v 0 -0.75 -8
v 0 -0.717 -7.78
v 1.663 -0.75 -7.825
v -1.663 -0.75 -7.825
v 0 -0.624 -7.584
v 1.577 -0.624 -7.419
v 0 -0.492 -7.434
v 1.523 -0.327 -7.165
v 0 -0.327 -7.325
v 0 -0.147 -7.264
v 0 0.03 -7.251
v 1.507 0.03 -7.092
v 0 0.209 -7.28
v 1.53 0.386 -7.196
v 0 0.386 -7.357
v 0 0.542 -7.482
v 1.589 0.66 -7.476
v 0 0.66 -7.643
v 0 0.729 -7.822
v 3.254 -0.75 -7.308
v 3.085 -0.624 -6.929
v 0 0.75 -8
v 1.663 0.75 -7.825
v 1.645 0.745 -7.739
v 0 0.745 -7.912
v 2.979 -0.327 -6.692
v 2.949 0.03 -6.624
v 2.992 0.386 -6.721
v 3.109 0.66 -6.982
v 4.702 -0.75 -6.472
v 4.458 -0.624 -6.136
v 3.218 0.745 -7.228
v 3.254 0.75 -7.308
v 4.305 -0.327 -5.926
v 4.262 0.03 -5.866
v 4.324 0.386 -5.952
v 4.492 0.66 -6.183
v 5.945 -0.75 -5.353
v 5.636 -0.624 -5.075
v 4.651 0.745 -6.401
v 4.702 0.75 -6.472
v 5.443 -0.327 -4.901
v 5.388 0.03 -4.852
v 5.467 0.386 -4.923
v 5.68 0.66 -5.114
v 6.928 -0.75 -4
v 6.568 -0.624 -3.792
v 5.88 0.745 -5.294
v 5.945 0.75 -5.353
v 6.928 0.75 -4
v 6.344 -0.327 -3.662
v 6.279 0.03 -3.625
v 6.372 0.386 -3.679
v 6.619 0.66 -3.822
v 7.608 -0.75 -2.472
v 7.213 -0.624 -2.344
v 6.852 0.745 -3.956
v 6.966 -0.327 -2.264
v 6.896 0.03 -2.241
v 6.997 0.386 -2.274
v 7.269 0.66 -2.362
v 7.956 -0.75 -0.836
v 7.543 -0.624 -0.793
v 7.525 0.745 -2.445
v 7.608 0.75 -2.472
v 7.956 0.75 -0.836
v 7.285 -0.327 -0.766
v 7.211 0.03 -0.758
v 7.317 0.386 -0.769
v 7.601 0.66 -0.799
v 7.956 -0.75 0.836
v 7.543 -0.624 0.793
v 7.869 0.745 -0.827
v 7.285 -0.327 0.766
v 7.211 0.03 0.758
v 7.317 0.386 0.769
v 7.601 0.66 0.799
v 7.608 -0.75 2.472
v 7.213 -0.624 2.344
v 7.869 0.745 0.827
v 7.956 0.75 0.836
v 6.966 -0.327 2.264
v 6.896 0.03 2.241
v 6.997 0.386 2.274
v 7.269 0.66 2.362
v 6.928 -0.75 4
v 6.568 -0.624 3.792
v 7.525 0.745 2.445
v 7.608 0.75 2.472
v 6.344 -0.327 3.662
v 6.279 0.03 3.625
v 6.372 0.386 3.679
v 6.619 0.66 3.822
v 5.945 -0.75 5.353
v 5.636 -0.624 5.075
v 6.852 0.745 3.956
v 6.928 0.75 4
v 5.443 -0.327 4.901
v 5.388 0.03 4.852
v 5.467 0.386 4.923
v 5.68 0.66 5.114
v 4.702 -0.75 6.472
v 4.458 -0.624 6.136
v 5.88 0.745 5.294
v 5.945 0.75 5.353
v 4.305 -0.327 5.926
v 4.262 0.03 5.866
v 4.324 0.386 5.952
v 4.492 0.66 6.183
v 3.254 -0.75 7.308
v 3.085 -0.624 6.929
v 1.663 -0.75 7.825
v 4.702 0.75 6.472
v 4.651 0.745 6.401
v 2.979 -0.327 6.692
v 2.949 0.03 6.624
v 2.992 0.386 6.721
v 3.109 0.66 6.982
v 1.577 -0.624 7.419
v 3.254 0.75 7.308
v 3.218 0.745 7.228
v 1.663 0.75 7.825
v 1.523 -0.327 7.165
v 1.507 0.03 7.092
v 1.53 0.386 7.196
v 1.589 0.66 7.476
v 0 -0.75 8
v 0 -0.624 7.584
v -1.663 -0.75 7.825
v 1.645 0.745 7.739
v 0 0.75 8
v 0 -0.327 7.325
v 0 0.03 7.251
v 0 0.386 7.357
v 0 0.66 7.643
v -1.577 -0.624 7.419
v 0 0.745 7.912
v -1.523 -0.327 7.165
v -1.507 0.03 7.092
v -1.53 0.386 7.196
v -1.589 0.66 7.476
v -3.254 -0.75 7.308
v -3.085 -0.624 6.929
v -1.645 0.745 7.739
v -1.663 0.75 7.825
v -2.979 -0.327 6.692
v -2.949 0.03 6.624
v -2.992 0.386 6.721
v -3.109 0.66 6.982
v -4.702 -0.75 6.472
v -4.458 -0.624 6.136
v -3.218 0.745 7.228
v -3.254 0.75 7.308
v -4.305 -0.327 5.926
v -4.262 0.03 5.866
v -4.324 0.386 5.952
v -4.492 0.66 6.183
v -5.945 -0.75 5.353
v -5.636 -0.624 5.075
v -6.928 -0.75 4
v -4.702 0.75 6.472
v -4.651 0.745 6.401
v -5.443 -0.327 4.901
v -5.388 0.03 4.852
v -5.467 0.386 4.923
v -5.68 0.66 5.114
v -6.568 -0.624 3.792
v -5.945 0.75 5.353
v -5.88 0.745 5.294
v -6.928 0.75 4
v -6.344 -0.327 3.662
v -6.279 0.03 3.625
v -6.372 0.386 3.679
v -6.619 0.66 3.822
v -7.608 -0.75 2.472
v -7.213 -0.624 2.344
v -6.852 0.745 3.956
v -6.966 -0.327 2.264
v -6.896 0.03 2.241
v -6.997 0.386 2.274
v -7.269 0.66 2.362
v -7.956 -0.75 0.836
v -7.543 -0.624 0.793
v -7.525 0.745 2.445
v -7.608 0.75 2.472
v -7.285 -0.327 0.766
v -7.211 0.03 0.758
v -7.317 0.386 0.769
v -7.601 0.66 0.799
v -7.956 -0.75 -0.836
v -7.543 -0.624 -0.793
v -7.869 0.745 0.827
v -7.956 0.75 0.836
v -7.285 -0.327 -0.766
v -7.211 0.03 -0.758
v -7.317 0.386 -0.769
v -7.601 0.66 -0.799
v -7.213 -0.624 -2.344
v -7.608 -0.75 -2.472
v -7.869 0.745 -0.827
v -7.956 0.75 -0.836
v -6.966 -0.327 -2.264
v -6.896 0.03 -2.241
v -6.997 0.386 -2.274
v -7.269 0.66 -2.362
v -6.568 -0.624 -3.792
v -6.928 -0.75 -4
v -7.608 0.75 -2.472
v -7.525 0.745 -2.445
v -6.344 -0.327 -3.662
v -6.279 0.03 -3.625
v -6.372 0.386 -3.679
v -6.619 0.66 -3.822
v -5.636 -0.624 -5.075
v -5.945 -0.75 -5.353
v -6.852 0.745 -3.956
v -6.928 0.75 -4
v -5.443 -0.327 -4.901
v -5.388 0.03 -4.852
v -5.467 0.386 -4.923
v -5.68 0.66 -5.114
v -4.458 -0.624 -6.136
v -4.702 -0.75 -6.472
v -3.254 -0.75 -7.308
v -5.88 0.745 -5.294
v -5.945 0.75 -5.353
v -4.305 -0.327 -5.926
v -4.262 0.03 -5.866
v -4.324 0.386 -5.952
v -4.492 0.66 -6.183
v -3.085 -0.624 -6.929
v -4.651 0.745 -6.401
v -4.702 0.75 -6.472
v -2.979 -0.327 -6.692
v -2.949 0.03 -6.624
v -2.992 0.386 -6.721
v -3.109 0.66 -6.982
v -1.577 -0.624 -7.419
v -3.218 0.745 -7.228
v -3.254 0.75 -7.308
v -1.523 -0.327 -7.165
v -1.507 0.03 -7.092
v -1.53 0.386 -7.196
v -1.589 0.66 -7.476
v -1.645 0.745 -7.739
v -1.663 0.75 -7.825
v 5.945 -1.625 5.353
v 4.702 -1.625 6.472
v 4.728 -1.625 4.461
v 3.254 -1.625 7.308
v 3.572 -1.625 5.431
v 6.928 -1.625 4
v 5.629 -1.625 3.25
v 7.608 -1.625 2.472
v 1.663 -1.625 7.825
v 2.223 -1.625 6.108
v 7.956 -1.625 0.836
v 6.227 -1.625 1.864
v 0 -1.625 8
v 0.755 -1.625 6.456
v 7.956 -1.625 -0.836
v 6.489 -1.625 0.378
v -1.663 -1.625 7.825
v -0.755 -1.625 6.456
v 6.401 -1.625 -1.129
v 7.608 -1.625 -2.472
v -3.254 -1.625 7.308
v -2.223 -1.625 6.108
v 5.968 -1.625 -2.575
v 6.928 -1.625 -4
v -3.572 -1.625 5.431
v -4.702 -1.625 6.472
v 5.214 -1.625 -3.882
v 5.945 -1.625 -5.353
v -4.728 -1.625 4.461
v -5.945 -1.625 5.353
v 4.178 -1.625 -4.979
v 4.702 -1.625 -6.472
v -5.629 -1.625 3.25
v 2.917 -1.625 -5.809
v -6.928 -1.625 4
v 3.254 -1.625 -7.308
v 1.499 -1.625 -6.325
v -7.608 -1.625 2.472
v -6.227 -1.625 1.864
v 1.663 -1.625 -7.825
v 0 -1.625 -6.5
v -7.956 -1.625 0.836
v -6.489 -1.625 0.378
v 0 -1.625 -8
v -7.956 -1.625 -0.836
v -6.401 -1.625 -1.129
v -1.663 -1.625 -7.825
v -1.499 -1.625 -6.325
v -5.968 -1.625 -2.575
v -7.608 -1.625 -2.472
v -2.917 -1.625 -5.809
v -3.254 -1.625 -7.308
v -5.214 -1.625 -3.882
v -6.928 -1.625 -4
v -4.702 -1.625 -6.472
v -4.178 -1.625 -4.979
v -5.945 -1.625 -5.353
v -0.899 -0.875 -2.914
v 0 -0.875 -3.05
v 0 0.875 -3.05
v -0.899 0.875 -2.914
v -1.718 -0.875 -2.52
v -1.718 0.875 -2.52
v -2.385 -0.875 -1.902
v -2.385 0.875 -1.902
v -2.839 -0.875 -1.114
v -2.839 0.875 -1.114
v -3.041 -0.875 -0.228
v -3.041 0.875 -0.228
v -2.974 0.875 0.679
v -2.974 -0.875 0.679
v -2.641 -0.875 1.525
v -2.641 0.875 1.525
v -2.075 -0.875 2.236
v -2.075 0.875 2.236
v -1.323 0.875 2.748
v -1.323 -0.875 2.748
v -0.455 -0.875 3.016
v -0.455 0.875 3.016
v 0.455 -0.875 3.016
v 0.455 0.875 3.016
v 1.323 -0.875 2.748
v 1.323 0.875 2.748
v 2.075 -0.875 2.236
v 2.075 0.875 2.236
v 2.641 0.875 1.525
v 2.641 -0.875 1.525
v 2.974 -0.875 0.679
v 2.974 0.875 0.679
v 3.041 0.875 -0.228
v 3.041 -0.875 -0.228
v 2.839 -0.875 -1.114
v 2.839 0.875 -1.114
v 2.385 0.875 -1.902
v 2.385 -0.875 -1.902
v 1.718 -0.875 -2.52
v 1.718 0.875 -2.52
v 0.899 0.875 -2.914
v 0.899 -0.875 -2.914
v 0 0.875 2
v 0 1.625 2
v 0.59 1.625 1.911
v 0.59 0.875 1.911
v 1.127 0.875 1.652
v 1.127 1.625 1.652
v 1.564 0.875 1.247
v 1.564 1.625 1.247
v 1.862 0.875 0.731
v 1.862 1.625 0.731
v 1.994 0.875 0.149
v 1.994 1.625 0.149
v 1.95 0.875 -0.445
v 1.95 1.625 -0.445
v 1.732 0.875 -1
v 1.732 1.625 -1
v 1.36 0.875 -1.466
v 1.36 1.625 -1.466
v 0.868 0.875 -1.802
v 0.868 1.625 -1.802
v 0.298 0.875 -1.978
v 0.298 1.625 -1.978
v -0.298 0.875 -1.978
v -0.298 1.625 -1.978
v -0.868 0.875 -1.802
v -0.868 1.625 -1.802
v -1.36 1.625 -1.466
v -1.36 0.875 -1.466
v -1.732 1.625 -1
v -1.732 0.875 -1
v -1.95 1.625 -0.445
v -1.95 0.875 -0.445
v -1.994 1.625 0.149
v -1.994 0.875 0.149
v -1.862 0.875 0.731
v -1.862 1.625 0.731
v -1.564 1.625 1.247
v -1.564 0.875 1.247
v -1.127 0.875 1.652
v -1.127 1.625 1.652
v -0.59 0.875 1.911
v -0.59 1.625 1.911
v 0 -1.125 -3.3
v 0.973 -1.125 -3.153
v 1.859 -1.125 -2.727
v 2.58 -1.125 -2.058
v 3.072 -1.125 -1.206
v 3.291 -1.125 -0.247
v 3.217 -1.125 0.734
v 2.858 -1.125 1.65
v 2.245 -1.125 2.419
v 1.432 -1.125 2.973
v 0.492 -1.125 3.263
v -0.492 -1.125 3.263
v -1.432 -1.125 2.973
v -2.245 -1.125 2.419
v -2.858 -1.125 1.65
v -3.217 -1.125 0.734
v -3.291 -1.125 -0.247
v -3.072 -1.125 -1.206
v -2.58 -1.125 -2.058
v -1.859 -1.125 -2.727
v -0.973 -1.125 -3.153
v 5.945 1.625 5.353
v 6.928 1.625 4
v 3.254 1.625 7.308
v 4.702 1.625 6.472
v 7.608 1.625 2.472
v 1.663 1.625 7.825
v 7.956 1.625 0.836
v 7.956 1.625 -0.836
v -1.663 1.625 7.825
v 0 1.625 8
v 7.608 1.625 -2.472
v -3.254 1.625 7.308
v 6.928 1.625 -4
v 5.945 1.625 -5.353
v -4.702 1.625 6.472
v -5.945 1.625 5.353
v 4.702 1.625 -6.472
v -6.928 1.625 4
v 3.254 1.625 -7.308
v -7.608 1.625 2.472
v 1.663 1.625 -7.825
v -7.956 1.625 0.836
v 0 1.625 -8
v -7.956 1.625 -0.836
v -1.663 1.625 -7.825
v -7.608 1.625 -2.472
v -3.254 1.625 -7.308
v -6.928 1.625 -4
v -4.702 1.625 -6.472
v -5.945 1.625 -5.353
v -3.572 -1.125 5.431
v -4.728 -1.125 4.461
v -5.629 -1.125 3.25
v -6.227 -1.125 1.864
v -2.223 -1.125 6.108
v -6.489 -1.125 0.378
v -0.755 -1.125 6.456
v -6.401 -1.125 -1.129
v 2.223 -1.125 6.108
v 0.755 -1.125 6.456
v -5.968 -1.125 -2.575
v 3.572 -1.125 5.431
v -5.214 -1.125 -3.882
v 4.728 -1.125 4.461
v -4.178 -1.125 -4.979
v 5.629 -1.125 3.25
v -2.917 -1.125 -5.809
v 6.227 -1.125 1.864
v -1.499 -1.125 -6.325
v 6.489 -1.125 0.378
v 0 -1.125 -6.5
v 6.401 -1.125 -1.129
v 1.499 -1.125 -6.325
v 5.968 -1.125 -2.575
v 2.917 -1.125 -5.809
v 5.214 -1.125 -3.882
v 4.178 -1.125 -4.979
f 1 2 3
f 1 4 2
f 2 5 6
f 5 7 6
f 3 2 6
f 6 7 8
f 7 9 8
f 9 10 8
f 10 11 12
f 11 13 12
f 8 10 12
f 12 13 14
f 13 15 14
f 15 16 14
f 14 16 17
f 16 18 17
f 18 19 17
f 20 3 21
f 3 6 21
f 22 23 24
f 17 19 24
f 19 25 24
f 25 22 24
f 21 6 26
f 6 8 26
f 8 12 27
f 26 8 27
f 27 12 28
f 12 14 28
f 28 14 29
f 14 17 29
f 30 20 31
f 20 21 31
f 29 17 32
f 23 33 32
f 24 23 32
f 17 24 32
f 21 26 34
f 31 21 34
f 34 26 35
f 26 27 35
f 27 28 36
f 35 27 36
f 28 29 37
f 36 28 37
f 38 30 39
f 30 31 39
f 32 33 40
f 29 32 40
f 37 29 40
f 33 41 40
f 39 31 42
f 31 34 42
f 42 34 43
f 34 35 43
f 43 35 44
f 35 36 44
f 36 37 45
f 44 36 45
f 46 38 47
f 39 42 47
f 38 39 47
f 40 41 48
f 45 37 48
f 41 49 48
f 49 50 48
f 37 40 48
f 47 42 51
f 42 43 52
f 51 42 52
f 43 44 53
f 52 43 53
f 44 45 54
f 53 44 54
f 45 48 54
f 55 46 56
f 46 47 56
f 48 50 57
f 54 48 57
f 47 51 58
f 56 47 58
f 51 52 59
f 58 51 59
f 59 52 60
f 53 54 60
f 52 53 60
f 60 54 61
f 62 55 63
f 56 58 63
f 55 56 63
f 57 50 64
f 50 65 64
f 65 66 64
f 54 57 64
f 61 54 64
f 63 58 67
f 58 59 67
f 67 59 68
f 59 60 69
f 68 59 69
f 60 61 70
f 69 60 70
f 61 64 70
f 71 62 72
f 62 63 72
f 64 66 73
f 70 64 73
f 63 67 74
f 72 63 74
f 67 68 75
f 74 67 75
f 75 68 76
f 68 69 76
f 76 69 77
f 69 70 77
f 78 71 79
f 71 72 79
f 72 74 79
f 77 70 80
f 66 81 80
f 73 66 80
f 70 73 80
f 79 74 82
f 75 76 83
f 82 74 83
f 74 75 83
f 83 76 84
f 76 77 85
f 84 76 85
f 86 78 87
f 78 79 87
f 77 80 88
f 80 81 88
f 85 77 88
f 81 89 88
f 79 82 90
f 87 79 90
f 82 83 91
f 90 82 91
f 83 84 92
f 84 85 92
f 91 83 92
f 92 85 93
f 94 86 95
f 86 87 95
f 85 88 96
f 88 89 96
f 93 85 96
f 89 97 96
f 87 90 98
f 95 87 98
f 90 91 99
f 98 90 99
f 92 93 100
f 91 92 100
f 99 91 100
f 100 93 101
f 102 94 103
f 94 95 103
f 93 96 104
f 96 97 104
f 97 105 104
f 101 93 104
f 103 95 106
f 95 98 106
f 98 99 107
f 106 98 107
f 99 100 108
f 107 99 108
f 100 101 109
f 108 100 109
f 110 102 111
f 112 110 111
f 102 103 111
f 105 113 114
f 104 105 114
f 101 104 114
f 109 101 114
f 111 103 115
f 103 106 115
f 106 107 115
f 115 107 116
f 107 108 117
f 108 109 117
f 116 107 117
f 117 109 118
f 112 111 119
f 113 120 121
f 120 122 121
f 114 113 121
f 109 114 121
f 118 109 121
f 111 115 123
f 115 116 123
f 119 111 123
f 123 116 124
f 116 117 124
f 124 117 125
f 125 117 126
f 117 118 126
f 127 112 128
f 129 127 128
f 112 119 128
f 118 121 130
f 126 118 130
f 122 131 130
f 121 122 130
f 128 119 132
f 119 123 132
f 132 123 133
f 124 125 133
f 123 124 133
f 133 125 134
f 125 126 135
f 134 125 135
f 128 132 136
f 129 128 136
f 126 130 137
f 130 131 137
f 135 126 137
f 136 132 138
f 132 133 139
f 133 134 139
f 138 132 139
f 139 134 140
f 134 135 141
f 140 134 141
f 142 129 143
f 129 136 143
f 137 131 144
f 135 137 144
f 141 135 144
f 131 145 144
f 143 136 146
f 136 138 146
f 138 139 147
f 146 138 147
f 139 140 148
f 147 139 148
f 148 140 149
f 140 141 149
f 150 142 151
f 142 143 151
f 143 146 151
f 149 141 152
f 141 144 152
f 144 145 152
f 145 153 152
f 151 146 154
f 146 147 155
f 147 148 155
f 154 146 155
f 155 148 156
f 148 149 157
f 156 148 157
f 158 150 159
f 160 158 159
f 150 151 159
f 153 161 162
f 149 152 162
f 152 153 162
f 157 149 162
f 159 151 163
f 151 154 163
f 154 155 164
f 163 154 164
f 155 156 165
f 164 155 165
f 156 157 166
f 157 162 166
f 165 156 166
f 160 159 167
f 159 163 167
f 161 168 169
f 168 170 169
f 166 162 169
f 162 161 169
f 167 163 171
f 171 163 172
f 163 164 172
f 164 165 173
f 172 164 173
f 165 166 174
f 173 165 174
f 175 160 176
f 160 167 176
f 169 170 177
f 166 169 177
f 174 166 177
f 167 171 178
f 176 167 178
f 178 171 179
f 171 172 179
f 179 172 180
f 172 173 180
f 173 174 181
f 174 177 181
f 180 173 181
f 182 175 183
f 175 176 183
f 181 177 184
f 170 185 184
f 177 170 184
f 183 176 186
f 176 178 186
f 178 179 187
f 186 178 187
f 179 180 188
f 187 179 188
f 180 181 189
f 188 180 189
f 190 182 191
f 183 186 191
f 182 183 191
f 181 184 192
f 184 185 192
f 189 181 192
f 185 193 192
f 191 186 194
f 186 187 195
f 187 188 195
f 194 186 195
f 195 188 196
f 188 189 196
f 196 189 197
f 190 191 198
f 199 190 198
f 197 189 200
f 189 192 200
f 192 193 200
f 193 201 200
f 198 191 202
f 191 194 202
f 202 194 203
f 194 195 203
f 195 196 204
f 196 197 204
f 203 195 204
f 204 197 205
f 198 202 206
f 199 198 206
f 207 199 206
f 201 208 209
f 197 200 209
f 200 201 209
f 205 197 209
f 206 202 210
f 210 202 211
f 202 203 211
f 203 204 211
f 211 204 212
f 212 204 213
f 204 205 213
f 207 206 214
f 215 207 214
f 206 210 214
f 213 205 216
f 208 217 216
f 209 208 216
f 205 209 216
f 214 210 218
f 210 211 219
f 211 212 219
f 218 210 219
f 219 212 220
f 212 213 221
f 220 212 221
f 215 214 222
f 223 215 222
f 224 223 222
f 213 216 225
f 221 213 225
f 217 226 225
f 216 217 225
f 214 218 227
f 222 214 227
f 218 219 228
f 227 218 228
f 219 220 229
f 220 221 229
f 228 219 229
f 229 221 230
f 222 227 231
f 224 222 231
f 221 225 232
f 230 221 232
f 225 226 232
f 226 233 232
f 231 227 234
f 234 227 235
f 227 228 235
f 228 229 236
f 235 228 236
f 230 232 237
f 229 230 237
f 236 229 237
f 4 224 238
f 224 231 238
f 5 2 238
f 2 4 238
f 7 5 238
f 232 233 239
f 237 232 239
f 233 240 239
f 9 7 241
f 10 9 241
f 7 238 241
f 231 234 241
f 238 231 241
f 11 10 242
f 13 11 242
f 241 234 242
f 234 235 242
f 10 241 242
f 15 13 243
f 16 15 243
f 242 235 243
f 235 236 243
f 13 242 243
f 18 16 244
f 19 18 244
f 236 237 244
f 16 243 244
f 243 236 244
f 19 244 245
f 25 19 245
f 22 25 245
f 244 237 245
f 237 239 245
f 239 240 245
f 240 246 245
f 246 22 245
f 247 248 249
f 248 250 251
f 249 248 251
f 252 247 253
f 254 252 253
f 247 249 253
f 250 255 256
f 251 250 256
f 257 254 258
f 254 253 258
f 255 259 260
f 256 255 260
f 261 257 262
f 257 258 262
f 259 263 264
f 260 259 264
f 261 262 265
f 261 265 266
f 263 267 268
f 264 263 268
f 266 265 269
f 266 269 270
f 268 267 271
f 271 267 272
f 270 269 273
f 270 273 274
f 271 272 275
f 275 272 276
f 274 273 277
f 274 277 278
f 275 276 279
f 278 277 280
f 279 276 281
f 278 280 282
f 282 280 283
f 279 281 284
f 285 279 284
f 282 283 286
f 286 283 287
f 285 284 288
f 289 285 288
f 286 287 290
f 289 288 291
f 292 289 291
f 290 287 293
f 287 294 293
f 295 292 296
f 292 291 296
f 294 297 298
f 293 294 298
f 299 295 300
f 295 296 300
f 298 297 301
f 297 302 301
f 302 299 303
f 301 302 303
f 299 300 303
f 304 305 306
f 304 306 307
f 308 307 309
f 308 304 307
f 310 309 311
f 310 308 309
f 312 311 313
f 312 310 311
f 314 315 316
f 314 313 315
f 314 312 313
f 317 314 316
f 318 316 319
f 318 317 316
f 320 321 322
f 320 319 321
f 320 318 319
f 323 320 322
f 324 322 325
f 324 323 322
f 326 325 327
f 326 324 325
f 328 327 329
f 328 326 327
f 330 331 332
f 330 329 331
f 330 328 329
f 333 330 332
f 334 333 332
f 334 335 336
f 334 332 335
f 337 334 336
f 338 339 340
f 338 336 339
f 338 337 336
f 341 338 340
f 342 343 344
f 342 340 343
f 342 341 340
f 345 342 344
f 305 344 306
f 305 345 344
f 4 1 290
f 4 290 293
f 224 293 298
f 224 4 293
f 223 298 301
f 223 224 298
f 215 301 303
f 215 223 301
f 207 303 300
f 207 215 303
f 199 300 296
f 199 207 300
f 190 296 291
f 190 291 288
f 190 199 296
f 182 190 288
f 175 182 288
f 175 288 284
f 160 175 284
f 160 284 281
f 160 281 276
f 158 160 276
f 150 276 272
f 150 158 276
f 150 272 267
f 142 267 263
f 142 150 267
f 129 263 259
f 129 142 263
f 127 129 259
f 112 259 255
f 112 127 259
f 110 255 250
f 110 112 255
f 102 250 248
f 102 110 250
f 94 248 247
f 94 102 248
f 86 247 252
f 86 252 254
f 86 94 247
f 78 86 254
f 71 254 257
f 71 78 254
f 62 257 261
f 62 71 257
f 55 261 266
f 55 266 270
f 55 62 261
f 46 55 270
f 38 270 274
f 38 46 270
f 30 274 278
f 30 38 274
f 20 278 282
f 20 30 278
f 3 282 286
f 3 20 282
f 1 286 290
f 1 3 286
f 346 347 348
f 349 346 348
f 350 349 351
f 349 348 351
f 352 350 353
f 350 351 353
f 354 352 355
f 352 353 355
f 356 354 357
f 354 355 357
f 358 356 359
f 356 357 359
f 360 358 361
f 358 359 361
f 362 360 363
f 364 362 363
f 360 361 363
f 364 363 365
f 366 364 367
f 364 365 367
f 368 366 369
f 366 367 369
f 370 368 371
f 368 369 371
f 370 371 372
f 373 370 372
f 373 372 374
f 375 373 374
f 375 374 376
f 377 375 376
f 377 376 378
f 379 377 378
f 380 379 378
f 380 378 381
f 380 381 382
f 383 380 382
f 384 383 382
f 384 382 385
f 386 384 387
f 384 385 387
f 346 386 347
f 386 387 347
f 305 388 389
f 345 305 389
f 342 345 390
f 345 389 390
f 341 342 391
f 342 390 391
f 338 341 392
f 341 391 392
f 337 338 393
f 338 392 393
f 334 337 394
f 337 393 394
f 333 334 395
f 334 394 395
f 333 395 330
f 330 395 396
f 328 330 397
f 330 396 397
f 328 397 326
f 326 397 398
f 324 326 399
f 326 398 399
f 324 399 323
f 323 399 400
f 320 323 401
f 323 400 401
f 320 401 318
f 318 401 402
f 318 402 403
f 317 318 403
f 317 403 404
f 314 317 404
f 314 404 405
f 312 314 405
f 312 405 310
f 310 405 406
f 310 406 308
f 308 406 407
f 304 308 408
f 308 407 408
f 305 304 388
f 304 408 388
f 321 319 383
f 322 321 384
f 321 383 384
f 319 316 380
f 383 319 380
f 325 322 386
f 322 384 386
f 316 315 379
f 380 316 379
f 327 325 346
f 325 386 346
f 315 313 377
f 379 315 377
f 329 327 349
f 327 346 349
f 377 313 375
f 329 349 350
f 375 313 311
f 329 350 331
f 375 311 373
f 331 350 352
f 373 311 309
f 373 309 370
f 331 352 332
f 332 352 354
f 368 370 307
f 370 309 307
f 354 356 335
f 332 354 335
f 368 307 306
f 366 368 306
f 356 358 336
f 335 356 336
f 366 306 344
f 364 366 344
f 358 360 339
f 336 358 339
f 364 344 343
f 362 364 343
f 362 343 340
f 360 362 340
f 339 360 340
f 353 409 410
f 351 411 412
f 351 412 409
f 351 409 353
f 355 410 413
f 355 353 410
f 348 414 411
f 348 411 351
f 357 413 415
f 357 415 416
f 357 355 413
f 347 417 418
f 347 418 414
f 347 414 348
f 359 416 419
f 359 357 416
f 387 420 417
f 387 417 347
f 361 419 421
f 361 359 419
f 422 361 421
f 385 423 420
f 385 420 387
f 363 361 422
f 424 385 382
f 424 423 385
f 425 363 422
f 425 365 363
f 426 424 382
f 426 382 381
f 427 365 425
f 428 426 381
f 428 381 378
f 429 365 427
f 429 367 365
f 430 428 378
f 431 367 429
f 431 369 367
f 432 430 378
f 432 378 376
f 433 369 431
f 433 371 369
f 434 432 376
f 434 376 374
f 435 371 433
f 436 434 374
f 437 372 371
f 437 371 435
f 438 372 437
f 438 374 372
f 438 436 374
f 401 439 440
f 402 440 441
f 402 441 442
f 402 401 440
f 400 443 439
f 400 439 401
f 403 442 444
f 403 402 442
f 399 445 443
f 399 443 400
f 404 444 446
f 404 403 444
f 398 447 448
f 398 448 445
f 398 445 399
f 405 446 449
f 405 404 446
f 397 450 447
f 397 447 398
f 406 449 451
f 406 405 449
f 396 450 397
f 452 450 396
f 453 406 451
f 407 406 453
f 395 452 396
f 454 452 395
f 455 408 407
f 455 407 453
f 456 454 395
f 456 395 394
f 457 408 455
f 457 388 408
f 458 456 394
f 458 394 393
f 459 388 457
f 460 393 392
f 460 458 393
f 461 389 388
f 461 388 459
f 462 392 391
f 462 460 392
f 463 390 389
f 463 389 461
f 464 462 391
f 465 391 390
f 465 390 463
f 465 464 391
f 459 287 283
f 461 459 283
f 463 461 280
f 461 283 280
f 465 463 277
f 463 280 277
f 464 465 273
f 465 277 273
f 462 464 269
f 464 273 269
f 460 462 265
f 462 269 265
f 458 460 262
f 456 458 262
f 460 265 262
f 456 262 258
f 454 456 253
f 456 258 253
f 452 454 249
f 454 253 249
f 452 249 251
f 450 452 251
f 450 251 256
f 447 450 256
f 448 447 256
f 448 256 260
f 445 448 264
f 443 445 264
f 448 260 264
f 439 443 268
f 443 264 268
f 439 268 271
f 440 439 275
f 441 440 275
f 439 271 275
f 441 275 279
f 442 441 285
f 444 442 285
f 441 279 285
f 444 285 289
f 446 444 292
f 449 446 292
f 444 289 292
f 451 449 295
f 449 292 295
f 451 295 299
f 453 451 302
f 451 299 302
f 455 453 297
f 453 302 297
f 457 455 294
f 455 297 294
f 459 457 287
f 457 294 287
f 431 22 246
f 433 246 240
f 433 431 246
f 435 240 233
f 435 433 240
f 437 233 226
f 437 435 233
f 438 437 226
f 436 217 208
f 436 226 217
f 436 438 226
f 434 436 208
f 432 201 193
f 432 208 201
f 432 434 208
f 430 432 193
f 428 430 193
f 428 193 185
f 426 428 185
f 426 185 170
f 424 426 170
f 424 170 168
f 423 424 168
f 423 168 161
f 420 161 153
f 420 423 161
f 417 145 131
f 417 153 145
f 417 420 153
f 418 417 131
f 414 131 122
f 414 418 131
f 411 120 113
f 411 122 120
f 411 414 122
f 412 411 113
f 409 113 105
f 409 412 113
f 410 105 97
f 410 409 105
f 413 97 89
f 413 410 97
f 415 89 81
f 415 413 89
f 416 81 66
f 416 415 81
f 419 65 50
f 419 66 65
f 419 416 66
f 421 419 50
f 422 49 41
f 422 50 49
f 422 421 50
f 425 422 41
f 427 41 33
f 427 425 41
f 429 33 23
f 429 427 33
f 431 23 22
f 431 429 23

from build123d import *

# Parameters (mm, degrees)
SKETCH1_R           = 8
SKETCH1_R_2         = 3.05
BOSS_EXTRUDE1_DEPTH = 1.625
SKETCH3_R           = 3.5
SKETCH3_R_2         = 2
BOSS_EXTRUDE2_DEPTH = 0.75
SKETCH4_R           = 6.5
SKETCH4_R_2         = 3
CUT_EXTRUDE1_DEPTH  = 0.5
CHAMFER1_SIZE       = 0.25


with BuildPart() as part:
    # Sketch1 → Boss-Extrude1 (new, symmetric)
    with BuildSketch(Plane(origin=(0, 0, 0), x_dir=(1, 0, 0), z_dir=(0, 1, 0))):
        with Locations(Location((0, 0, 0), (0, 0, 90))):
            Circle(SKETCH1_R)
        with Locations(Location((0, 0, 0), (0, 0, 90))):
            Circle(SKETCH1_R_2, mode=Mode.SUBTRACT)
    extrude(amount=BOSS_EXTRUDE1_DEPTH, both=True)

    # Sketch2 → Cut-Revolve1 (revolve, cut)
    with BuildSketch(Plane(origin=(0, 0, 0), x_dir=(0, 0, -1), z_dir=(1, 0, 0)), mode=Mode.PRIVATE) as cut_revolve1_sk:
        with BuildLine():
            Line((-8, 0.75), (-8, -0.75))
            add(Edge.make_bspline(
                [(-8, -0.75), (-7.25, -0.75), (-7.25, 0), (-7.25, 0.75), (-8, 0.75)],
                knots=[1.570796327, 1.570796327, 1.570796327, 3.141592654, 3.141592654, 4.71238898, 4.71238898, 4.71238898], degree=2, weights=[1, 0.707106781, 1, 0.707106781, 1]))
        make_face()
    revolve(cut_revolve1_sk.sketch.rotate(Axis((0, 1.625, 0), (0, -1, 0)), 180), axis=Axis((0, 1.625, 0), (0, -1, 0)), mode=Mode.SUBTRACT)

    # Sketch3 → Boss-Extrude2 (add)
    with BuildSketch(Plane(origin=(0, 1.625, 0), x_dir=(1, 0, 0), z_dir=(0, 1, 0))):
        Circle(SKETCH3_R)
        with Locations(Location((0, 0, 0), (0, 0, 270))):
            Circle(SKETCH3_R_2, mode=Mode.SUBTRACT)
    extrude(amount=-BOSS_EXTRUDE2_DEPTH)

    # Sketch4 → Cut-Extrude1 (cut)
    with BuildSketch(Plane.XZ.offset(1.625)):
        with Locations(Location((0, 0, 0), (0, 0, 270))):
            Circle(SKETCH4_R)
        Circle(SKETCH4_R_2, mode=Mode.SUBTRACT)
    extrude(amount=-CUT_EXTRUDE1_DEPTH, mode=Mode.SUBTRACT)

    # Chamfer1
    chamfer1_edges = [part.edges().sort_by_distance(p)[0] for p in [
        (0, -1.125, 3.05),
    ]]
    chamfer(chamfer1_edges, length=CHAMFER1_SIZE)


solid = part.part
